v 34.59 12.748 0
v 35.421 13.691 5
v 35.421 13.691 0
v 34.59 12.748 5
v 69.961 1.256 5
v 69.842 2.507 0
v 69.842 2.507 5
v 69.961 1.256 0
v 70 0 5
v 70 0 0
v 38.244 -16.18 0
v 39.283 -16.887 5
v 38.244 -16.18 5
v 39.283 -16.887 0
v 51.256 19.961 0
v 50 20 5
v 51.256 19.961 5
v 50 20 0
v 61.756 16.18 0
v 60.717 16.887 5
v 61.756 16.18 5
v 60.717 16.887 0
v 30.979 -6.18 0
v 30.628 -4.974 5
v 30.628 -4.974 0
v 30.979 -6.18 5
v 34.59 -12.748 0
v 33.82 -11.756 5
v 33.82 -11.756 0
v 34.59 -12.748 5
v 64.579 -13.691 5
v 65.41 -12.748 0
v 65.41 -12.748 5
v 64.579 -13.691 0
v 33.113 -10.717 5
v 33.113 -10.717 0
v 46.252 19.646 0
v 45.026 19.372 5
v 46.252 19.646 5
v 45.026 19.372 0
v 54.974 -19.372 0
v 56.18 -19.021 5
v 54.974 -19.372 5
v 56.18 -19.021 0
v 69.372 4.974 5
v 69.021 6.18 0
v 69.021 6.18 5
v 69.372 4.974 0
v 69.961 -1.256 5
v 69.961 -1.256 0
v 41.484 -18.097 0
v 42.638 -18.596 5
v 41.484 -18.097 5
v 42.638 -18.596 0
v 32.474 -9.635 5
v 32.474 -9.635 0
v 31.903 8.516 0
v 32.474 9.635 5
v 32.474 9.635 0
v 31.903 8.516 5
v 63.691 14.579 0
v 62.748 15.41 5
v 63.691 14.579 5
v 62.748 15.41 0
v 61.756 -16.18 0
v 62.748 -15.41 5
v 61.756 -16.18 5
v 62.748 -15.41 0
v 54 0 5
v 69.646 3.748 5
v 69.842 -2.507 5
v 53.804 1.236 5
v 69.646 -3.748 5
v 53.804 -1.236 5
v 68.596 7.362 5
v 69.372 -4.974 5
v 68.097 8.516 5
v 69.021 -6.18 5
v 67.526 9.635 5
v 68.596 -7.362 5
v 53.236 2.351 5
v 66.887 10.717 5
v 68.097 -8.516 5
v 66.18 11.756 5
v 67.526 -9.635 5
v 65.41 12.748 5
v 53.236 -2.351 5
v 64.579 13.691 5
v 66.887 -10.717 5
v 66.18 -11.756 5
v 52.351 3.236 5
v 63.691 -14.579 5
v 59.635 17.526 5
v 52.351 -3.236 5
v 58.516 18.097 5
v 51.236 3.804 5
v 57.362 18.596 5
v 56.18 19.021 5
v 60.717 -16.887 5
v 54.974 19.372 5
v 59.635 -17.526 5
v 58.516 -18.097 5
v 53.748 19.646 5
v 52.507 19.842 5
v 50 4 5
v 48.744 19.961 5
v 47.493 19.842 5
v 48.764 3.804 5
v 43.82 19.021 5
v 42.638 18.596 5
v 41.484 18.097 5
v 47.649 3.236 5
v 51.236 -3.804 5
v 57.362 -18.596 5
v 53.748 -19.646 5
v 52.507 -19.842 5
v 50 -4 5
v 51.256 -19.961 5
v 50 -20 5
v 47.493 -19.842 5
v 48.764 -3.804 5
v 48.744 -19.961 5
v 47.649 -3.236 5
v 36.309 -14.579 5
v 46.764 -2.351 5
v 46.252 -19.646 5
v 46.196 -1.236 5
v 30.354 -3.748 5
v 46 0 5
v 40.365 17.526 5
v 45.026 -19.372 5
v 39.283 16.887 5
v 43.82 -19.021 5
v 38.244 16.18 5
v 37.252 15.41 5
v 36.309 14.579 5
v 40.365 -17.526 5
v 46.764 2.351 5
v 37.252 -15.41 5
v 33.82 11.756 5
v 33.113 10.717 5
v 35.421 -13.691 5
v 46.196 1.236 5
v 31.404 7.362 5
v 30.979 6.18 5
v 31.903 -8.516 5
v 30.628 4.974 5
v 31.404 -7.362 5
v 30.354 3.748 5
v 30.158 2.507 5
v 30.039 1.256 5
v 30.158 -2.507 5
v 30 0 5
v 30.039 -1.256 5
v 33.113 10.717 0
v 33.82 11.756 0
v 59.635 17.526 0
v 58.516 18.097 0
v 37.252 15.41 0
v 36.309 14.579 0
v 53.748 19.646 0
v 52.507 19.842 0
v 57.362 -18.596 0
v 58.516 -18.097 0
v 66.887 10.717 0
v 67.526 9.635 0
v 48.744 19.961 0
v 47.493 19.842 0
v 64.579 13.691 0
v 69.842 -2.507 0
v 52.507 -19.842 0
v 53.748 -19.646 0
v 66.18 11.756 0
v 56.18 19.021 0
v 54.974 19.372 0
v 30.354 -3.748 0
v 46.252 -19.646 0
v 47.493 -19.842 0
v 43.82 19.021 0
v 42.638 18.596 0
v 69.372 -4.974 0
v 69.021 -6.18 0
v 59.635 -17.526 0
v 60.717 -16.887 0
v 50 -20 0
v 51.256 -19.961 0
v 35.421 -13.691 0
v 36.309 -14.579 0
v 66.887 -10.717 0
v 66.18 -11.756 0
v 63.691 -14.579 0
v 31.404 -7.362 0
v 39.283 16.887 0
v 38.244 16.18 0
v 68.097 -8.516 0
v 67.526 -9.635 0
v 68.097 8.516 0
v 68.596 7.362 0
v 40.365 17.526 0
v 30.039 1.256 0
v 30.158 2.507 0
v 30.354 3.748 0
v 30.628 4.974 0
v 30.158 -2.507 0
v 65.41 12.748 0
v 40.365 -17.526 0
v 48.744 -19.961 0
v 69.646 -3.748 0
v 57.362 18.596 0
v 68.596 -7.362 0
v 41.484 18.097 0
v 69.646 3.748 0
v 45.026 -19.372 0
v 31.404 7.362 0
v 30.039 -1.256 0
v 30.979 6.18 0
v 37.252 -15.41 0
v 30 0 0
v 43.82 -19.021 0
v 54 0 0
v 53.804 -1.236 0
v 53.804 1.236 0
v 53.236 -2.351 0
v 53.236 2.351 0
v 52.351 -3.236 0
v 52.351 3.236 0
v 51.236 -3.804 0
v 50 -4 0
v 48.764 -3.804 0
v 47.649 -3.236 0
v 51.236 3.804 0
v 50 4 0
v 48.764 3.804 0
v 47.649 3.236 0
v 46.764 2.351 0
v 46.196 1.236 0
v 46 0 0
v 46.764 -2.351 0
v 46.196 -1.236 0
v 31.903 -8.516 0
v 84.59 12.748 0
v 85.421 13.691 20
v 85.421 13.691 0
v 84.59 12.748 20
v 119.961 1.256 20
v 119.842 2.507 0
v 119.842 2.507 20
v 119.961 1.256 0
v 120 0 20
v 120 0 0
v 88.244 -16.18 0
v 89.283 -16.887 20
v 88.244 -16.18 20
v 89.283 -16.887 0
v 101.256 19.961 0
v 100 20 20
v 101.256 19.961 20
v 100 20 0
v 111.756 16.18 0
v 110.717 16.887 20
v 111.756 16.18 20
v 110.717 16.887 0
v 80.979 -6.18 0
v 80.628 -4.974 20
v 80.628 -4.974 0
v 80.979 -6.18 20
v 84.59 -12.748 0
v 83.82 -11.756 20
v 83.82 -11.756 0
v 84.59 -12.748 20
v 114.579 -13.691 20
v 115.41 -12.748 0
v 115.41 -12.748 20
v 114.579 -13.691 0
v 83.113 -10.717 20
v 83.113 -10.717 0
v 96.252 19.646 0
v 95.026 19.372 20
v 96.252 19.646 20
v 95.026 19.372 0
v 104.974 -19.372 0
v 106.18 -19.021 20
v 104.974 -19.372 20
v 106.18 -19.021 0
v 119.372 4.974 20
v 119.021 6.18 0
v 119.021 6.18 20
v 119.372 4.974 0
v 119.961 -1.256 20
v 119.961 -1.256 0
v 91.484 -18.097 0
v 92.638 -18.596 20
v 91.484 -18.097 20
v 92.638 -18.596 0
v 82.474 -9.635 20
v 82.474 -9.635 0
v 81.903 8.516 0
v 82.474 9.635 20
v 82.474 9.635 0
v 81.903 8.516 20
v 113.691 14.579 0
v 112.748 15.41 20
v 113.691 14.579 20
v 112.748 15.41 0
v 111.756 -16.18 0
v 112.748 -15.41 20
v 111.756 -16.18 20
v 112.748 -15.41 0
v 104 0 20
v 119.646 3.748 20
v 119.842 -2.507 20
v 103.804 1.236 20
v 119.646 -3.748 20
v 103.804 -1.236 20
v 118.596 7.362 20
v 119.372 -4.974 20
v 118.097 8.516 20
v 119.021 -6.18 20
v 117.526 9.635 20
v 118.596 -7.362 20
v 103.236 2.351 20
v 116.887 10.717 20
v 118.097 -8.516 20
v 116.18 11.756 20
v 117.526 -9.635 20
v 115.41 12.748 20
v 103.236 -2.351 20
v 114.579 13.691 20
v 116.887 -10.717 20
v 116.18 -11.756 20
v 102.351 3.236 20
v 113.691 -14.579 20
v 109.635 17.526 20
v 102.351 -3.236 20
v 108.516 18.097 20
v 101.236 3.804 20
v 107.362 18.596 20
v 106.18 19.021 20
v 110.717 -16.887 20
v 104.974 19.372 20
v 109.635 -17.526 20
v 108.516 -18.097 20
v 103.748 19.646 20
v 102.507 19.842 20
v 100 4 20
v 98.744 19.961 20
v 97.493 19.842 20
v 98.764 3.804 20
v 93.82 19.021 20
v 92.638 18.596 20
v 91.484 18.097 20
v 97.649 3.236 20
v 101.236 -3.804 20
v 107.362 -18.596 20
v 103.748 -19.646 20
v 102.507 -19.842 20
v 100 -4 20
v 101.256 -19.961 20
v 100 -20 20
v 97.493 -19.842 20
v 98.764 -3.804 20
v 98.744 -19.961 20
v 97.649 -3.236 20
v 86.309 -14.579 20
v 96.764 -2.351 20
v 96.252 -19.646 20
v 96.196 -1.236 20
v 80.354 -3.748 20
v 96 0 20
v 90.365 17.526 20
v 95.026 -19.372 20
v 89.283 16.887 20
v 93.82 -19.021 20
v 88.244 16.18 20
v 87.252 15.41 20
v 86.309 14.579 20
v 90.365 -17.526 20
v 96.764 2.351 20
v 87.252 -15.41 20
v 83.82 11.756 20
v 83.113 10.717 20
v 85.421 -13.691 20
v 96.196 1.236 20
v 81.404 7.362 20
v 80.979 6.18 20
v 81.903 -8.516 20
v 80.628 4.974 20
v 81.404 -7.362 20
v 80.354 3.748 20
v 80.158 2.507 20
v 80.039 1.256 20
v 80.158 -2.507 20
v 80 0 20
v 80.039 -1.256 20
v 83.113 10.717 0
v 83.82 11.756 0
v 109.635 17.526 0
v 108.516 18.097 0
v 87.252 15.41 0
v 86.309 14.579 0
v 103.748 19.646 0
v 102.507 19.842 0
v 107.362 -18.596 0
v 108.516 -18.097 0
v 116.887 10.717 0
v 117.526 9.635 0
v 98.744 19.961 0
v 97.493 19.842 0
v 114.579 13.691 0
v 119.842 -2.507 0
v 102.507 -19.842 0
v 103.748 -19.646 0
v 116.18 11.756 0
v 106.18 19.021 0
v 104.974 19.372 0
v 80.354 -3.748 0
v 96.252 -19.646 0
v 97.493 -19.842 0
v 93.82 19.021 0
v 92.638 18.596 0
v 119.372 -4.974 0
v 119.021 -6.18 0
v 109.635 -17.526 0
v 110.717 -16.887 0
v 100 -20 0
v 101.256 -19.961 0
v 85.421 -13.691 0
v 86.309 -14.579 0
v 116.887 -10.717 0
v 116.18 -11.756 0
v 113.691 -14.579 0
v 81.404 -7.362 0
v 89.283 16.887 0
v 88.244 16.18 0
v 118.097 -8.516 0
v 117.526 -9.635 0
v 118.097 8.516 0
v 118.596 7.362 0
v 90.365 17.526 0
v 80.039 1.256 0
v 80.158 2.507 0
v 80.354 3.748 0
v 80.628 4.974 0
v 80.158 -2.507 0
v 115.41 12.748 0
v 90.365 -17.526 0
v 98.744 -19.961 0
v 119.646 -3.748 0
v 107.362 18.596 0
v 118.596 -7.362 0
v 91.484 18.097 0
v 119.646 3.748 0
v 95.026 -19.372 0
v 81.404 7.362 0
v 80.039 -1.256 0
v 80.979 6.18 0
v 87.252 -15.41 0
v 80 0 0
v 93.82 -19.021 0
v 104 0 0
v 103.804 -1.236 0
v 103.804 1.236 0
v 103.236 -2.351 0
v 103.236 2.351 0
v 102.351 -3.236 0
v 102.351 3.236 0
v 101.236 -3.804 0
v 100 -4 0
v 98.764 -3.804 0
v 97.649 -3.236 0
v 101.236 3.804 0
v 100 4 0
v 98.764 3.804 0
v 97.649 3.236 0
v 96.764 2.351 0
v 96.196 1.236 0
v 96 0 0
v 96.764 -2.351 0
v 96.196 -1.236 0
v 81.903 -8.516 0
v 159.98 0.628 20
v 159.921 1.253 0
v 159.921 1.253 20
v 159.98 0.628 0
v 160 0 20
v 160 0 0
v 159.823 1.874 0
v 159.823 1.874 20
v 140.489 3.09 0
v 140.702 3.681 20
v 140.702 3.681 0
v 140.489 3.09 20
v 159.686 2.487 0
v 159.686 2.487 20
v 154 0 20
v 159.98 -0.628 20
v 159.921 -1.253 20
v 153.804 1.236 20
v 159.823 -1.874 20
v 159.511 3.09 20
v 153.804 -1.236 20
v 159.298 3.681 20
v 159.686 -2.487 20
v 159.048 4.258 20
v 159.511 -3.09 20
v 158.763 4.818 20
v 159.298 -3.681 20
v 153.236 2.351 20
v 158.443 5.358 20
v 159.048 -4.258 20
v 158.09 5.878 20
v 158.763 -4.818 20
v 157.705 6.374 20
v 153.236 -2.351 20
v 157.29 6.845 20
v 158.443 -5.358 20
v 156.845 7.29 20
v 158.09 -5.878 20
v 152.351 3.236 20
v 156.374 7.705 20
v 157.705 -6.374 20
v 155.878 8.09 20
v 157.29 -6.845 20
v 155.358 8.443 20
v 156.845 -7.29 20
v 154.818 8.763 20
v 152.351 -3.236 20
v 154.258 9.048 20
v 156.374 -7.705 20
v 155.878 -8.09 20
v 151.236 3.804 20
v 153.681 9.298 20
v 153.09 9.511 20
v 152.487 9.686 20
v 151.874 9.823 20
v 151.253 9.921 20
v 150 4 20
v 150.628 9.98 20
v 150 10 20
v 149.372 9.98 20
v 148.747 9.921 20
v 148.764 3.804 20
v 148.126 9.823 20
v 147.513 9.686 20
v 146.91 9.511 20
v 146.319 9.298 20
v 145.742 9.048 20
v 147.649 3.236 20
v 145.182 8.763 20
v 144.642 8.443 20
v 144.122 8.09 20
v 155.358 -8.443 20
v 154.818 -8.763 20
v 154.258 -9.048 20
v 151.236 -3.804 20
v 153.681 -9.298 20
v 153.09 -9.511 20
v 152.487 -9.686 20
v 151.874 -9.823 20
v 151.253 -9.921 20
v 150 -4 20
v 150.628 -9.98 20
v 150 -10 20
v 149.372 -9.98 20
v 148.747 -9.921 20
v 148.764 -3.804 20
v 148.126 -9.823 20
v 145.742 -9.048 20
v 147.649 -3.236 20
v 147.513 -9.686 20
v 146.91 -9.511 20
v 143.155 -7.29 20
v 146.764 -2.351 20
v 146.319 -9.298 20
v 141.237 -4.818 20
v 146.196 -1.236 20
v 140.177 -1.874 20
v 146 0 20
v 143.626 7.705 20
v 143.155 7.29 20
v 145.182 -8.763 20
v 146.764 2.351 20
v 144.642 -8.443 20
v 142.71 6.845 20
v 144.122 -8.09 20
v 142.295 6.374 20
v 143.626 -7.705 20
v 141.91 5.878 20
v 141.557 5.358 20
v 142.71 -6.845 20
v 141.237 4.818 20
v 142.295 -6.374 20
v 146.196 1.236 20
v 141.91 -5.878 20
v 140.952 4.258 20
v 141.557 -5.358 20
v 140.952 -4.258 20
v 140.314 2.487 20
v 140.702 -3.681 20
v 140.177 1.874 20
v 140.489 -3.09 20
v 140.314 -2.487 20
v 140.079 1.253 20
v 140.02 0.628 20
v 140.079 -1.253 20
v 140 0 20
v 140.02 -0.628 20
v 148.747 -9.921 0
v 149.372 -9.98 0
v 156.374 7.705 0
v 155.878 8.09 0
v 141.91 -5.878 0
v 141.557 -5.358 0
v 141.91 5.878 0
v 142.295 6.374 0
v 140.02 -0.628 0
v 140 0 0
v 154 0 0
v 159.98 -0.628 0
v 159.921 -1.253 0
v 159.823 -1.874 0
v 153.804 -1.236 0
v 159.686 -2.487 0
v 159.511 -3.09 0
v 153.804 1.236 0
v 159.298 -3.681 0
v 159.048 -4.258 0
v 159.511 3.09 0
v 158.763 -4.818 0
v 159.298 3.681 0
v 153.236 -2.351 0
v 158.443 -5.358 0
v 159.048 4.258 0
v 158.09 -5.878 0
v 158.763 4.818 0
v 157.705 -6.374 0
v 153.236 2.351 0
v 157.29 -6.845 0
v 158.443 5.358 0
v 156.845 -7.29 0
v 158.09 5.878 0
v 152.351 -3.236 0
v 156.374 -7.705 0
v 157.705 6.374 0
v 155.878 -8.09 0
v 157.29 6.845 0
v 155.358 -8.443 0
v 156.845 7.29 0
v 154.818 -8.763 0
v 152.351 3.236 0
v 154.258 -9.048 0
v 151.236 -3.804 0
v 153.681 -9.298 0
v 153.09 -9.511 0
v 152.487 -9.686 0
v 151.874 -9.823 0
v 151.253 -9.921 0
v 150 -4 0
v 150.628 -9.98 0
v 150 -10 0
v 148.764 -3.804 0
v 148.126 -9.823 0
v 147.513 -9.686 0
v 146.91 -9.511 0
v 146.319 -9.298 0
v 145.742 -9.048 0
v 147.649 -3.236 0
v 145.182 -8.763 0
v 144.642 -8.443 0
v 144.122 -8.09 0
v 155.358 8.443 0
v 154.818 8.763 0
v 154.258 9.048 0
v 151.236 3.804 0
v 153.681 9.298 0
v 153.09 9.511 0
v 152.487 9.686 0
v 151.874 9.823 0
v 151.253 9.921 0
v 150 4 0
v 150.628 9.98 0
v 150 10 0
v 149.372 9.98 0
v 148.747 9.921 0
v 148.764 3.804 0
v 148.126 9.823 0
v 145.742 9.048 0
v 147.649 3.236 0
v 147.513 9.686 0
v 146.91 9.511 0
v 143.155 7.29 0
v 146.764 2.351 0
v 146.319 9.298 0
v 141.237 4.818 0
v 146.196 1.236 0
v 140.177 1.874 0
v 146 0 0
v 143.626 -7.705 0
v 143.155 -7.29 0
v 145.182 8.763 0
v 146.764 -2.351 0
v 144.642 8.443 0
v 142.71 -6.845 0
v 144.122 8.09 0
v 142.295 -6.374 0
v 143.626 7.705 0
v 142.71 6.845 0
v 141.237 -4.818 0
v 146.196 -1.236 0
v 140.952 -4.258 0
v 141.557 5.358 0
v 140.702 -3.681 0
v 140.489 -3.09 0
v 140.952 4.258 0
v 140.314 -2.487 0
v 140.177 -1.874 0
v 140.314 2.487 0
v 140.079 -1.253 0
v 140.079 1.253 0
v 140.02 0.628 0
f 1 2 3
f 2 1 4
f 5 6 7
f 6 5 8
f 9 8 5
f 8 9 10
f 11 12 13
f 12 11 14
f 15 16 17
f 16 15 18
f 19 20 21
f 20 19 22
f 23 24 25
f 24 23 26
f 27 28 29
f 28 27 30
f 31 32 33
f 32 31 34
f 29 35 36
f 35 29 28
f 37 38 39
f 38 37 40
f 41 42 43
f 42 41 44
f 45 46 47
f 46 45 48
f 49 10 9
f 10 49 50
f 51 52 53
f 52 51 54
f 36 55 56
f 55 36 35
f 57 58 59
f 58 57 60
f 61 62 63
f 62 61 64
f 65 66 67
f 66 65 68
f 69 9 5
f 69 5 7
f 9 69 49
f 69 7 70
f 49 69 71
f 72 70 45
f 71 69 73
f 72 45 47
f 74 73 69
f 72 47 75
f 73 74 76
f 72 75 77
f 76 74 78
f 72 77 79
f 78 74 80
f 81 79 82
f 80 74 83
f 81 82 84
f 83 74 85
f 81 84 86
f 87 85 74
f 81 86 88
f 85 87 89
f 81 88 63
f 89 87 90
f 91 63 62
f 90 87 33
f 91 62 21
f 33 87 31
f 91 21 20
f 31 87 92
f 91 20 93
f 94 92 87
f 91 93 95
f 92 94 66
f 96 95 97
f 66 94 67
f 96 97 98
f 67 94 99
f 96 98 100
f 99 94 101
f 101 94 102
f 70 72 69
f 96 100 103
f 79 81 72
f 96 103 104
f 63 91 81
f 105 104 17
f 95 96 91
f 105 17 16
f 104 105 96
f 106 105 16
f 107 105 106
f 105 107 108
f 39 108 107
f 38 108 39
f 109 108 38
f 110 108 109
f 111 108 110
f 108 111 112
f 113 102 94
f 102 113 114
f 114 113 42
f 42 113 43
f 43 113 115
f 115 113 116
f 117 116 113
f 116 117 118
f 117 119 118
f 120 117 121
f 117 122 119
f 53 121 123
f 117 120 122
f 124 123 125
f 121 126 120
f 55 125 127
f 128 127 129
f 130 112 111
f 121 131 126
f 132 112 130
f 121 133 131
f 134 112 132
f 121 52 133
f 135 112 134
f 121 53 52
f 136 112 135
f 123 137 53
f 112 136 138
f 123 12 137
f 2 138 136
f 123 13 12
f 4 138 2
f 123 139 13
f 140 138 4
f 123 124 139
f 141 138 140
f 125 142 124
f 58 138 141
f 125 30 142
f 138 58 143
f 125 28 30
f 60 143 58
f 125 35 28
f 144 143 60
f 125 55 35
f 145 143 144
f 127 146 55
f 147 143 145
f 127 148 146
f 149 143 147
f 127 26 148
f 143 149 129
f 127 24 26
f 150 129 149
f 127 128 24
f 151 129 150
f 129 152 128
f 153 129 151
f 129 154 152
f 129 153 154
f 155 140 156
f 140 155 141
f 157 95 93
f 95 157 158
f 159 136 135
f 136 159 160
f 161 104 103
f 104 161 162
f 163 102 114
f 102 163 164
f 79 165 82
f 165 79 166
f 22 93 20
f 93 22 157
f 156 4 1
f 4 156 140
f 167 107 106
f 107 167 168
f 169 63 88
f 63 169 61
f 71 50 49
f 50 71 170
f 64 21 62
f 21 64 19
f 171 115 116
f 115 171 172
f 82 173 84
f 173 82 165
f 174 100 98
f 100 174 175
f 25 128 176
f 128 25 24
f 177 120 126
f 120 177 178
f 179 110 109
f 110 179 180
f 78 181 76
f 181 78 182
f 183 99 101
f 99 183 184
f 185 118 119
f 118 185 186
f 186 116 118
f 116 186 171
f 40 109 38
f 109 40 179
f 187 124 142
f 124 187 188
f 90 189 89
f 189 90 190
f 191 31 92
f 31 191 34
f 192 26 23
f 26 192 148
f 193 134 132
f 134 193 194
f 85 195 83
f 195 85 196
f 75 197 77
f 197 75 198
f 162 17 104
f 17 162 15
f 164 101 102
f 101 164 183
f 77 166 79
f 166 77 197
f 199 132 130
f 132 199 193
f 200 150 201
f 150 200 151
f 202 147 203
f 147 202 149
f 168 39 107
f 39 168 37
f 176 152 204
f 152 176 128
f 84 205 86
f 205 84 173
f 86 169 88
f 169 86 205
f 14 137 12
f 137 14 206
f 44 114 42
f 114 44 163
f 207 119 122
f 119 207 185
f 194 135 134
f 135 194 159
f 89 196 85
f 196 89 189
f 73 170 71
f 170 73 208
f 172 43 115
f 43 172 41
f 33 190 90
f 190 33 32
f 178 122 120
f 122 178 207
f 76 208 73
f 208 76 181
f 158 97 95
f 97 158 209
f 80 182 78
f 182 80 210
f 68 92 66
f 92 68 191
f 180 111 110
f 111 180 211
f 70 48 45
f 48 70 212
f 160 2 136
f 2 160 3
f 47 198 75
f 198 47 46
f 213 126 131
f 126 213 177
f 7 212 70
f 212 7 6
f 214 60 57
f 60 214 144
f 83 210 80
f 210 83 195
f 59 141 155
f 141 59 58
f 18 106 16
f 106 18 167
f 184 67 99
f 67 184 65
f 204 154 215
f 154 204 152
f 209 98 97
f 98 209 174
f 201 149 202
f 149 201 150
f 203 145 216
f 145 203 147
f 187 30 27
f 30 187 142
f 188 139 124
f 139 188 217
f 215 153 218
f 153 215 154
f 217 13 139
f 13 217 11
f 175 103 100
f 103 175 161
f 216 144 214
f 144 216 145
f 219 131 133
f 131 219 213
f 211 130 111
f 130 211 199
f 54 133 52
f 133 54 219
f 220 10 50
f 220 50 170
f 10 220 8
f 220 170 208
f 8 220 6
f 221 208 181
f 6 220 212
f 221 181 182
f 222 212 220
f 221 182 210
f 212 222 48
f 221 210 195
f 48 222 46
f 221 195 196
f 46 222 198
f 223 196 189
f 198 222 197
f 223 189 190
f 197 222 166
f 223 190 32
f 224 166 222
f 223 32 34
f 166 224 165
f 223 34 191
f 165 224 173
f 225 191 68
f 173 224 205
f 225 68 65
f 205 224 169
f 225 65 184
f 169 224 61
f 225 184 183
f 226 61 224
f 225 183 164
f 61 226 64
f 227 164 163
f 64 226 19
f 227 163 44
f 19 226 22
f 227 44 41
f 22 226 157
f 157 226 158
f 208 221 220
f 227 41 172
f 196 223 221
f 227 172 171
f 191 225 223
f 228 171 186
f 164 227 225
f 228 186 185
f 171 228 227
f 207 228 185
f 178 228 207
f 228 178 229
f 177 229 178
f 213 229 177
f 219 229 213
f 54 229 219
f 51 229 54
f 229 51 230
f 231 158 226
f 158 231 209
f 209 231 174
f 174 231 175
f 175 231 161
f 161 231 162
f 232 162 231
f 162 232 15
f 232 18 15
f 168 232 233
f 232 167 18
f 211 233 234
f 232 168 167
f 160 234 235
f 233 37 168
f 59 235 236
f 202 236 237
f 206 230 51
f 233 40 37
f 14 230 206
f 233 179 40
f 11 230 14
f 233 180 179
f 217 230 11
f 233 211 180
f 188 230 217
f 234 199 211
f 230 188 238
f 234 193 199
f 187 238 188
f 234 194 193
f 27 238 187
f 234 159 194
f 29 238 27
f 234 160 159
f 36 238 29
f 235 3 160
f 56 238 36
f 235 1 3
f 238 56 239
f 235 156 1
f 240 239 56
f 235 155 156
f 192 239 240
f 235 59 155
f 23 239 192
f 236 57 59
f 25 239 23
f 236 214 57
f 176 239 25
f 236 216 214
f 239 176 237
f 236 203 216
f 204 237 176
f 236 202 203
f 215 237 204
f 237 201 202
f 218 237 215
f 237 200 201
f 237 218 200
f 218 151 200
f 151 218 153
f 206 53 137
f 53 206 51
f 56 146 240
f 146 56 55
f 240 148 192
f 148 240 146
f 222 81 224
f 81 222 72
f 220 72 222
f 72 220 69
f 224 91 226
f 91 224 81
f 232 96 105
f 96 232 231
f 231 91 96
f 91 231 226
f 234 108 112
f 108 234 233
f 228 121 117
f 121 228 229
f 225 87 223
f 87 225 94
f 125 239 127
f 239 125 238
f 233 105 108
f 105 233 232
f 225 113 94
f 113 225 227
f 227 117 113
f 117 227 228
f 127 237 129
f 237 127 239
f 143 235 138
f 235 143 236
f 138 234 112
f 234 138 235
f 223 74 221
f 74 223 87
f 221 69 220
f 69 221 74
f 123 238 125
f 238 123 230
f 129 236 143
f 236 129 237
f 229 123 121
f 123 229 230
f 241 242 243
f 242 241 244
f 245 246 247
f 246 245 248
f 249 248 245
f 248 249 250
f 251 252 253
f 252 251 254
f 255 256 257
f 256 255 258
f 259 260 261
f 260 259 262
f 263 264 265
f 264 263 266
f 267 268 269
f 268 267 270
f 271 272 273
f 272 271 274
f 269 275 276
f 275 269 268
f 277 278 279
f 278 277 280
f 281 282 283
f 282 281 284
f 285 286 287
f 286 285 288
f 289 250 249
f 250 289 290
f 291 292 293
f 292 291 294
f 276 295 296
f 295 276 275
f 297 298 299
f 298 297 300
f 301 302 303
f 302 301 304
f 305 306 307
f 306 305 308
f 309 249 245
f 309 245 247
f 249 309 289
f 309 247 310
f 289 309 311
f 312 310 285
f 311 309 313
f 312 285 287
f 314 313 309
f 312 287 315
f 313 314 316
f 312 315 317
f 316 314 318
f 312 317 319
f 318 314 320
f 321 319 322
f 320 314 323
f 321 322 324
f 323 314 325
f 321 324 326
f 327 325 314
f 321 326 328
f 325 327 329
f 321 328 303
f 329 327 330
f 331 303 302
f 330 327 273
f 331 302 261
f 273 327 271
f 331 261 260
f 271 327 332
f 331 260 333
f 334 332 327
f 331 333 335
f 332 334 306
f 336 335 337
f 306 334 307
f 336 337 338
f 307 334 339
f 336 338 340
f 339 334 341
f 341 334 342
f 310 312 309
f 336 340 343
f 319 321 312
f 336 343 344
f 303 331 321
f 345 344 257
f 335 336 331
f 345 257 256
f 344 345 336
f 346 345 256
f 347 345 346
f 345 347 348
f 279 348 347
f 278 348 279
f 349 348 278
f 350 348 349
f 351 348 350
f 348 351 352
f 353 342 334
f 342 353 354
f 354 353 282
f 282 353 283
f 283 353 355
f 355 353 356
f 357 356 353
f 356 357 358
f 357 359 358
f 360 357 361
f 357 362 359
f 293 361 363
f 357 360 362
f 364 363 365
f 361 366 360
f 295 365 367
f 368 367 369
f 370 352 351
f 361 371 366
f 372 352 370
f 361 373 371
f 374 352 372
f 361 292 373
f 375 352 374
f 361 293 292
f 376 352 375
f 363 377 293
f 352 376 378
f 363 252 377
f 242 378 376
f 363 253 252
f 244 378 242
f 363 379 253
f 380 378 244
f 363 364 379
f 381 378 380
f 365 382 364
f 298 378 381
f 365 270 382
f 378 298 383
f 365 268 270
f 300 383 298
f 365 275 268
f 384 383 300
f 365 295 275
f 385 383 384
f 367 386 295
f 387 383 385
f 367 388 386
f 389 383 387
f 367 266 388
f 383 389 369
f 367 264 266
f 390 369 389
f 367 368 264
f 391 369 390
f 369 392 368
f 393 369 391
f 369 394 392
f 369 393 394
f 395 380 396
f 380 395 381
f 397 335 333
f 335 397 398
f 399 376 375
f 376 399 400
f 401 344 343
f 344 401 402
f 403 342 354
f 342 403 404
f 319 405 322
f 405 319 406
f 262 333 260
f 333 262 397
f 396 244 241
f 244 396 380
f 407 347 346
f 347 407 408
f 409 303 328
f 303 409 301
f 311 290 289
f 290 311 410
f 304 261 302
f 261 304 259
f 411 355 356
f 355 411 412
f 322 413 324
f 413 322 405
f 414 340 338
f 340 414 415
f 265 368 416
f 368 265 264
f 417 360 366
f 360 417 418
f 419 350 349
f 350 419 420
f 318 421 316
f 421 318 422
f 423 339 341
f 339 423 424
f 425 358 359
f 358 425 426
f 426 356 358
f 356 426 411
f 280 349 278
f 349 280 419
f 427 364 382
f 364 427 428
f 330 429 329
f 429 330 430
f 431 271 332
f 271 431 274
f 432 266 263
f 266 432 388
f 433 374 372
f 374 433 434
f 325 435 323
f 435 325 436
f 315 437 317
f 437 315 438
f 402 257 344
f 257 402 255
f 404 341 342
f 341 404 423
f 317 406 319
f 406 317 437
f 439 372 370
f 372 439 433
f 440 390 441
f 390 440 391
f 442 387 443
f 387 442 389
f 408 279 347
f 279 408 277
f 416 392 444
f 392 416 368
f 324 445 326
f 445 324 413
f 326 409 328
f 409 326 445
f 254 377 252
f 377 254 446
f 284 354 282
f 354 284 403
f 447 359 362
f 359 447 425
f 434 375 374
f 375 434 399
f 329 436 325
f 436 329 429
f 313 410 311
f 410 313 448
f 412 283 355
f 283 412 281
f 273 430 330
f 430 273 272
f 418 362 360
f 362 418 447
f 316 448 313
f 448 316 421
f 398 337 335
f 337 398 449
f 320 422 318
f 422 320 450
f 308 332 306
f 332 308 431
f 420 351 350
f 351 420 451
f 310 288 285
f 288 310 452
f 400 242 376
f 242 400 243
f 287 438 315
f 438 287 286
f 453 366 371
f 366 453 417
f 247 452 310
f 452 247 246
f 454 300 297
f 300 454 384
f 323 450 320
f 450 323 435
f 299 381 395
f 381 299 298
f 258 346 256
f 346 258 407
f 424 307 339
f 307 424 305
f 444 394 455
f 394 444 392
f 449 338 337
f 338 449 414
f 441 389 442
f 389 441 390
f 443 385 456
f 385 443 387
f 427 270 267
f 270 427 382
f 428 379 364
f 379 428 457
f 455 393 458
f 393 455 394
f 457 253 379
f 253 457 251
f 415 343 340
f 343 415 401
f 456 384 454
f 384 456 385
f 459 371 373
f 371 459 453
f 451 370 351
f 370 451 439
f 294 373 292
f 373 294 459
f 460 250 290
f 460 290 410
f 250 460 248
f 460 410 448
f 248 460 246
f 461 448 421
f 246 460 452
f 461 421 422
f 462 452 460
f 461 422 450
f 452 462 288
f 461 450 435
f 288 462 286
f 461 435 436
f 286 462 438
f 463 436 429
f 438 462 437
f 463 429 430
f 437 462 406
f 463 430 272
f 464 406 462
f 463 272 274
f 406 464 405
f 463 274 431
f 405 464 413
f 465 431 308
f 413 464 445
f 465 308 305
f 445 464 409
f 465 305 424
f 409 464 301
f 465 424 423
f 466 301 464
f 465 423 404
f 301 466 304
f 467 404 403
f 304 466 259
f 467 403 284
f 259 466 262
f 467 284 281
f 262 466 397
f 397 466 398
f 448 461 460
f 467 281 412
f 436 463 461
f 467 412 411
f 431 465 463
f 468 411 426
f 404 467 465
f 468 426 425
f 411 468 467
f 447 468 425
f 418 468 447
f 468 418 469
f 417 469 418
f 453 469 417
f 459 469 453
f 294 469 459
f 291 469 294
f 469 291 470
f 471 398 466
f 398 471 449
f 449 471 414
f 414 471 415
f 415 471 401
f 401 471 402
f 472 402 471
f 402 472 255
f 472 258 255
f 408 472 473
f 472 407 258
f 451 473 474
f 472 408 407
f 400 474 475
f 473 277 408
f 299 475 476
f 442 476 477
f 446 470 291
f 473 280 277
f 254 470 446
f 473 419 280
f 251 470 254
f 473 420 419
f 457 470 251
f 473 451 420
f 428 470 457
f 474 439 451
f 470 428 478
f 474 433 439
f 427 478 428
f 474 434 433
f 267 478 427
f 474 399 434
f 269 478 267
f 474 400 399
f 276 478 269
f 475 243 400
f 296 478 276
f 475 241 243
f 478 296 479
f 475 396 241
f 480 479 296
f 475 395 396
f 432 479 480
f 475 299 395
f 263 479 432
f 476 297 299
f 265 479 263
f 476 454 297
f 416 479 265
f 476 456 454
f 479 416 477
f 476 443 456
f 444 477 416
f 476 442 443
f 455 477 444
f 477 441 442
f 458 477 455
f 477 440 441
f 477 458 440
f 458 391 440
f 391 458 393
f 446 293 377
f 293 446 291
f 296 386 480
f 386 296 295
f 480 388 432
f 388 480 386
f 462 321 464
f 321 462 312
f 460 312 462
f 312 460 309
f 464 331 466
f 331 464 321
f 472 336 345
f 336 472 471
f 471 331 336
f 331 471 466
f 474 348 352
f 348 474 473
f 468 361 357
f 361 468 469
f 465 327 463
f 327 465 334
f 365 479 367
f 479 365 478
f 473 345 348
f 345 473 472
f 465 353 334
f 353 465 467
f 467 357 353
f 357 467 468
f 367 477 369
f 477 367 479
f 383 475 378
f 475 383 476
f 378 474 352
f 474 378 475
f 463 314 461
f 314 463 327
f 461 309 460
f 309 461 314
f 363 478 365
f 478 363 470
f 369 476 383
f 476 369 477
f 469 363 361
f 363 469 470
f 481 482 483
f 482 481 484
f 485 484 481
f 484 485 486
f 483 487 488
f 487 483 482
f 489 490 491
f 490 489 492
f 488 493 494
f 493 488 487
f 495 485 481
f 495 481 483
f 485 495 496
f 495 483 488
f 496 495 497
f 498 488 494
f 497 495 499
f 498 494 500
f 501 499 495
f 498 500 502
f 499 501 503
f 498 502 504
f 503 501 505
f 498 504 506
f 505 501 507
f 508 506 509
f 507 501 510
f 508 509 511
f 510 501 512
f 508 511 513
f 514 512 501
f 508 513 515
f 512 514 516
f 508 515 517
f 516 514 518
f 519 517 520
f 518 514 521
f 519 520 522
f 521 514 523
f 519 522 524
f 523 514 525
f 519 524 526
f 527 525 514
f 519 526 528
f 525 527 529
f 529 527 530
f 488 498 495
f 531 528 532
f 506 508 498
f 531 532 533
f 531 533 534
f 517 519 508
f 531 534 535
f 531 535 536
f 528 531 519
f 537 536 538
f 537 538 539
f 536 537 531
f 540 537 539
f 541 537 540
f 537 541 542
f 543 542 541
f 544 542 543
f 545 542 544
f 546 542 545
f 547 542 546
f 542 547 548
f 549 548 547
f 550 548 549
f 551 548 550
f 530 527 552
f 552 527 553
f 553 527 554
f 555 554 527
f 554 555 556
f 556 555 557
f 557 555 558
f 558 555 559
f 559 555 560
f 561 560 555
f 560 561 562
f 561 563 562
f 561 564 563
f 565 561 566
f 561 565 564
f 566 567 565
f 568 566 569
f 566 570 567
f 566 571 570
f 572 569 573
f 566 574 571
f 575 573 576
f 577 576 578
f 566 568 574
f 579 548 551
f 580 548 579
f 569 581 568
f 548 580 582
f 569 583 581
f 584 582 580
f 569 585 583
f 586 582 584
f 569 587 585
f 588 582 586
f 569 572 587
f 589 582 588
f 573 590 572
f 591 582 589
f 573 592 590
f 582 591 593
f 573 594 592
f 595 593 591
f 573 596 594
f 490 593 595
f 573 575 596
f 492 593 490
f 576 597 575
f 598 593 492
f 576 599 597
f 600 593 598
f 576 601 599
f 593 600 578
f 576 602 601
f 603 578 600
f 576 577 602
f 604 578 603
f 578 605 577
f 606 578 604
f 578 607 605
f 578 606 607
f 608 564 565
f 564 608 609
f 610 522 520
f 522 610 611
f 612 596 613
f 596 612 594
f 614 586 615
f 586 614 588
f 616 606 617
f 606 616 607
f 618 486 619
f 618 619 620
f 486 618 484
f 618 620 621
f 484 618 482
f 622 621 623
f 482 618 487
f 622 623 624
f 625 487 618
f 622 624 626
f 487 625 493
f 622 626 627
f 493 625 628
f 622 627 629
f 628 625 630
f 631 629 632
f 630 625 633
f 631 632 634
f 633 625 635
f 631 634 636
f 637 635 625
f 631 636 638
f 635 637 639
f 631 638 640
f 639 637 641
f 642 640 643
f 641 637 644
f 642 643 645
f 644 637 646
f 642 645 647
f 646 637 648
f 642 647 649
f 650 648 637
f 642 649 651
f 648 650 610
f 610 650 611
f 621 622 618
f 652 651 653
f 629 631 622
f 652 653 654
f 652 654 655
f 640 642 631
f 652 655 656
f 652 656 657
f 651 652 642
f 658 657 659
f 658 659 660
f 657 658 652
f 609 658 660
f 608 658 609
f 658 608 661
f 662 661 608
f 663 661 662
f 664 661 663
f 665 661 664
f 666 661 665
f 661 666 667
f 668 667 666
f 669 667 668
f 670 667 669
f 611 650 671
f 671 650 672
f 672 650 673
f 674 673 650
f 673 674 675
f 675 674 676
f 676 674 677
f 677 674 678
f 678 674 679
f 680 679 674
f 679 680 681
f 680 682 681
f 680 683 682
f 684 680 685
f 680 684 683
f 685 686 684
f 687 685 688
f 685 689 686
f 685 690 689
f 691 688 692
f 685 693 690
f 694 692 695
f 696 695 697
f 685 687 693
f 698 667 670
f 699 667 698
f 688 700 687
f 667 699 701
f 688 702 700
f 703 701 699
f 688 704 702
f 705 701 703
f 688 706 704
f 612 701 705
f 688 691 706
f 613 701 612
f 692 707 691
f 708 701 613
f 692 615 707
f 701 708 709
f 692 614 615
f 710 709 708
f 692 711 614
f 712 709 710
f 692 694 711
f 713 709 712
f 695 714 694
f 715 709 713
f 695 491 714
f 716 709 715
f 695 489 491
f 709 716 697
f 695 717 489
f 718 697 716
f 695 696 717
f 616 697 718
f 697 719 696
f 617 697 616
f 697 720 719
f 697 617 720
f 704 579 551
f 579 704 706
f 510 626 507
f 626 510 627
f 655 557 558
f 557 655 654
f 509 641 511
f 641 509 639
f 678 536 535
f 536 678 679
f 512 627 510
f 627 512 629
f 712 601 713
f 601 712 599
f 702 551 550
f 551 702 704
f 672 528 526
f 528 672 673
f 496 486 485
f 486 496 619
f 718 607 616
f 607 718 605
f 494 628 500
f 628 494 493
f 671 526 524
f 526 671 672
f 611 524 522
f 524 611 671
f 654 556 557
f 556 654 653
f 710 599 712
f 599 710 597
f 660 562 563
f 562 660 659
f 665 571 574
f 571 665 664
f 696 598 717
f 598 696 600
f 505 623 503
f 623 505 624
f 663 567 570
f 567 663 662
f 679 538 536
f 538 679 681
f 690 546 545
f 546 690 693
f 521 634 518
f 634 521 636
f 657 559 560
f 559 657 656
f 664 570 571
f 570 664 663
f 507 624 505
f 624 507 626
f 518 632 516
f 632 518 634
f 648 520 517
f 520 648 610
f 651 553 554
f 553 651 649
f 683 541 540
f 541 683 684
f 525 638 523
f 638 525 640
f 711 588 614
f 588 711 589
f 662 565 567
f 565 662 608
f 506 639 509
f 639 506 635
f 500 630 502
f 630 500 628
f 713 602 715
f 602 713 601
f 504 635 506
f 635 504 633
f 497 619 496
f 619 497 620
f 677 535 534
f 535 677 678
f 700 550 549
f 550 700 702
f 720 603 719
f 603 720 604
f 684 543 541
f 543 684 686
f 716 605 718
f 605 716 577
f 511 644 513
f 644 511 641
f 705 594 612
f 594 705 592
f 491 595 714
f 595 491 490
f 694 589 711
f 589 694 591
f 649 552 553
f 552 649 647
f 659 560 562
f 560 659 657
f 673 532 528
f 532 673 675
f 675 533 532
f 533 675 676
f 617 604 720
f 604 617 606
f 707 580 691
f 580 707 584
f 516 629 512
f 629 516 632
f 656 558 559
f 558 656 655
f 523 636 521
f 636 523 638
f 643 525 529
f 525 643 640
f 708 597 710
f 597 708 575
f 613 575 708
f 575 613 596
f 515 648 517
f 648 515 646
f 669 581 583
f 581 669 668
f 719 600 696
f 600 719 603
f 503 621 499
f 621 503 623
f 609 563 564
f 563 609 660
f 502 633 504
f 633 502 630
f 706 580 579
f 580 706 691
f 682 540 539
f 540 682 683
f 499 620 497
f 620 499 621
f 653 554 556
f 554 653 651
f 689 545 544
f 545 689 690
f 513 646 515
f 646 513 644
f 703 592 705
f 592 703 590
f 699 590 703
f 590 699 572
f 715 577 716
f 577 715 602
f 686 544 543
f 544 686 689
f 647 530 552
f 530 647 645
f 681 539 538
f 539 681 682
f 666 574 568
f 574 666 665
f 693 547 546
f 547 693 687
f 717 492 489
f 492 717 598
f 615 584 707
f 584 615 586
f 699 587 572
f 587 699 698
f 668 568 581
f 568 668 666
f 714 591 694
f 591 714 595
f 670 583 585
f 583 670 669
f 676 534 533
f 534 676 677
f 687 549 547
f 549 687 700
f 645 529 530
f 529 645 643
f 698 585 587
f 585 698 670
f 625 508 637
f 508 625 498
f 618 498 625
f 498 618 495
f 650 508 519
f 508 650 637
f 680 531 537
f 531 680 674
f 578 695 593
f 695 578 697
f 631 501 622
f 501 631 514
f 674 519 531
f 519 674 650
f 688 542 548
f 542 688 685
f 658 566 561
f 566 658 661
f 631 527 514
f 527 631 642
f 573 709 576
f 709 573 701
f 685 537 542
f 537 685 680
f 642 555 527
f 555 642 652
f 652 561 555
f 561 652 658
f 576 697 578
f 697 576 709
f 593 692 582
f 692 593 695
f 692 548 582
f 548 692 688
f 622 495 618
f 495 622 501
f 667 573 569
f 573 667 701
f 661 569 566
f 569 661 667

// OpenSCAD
// Especificamos que el parámetro grosor por defecto será 5mm, el diámetro por defecto 40mm y el diámetro del eje de 8mm
module rueda_simple(grosor=5, diametro=40, diam_eje=8){
    // Cilindro con agujero central
    difference(){
        // Cilindro exterior
        cylinder(r=diametro/2, h=grosor, $fn=100);
        // Cilindro taladro central.
        cylinder(r=diam_eje/2, h=grosor*3, $fn=20, center=true);
        // NOTA: Multiplicamos por 3 la altura para asegurar que se
        //     atraviesa completamente la figura.
        }
    }


// Creamos una rueda simple sin parámetros usando valores por defecto):
translate([50, 0, 0]){
    rueda_simple();
}

// Añadimos una segunda rueda únicamente cambiando el grosor a 20
translate([100, 0, 0]){
    rueda_simple(grosor=20);
}

// Finalmente creamos otra rueda cambiando el grosor a 20
translate([150, 0, 0]){
    rueda_simple(grosor=20, diametro=20);
}
